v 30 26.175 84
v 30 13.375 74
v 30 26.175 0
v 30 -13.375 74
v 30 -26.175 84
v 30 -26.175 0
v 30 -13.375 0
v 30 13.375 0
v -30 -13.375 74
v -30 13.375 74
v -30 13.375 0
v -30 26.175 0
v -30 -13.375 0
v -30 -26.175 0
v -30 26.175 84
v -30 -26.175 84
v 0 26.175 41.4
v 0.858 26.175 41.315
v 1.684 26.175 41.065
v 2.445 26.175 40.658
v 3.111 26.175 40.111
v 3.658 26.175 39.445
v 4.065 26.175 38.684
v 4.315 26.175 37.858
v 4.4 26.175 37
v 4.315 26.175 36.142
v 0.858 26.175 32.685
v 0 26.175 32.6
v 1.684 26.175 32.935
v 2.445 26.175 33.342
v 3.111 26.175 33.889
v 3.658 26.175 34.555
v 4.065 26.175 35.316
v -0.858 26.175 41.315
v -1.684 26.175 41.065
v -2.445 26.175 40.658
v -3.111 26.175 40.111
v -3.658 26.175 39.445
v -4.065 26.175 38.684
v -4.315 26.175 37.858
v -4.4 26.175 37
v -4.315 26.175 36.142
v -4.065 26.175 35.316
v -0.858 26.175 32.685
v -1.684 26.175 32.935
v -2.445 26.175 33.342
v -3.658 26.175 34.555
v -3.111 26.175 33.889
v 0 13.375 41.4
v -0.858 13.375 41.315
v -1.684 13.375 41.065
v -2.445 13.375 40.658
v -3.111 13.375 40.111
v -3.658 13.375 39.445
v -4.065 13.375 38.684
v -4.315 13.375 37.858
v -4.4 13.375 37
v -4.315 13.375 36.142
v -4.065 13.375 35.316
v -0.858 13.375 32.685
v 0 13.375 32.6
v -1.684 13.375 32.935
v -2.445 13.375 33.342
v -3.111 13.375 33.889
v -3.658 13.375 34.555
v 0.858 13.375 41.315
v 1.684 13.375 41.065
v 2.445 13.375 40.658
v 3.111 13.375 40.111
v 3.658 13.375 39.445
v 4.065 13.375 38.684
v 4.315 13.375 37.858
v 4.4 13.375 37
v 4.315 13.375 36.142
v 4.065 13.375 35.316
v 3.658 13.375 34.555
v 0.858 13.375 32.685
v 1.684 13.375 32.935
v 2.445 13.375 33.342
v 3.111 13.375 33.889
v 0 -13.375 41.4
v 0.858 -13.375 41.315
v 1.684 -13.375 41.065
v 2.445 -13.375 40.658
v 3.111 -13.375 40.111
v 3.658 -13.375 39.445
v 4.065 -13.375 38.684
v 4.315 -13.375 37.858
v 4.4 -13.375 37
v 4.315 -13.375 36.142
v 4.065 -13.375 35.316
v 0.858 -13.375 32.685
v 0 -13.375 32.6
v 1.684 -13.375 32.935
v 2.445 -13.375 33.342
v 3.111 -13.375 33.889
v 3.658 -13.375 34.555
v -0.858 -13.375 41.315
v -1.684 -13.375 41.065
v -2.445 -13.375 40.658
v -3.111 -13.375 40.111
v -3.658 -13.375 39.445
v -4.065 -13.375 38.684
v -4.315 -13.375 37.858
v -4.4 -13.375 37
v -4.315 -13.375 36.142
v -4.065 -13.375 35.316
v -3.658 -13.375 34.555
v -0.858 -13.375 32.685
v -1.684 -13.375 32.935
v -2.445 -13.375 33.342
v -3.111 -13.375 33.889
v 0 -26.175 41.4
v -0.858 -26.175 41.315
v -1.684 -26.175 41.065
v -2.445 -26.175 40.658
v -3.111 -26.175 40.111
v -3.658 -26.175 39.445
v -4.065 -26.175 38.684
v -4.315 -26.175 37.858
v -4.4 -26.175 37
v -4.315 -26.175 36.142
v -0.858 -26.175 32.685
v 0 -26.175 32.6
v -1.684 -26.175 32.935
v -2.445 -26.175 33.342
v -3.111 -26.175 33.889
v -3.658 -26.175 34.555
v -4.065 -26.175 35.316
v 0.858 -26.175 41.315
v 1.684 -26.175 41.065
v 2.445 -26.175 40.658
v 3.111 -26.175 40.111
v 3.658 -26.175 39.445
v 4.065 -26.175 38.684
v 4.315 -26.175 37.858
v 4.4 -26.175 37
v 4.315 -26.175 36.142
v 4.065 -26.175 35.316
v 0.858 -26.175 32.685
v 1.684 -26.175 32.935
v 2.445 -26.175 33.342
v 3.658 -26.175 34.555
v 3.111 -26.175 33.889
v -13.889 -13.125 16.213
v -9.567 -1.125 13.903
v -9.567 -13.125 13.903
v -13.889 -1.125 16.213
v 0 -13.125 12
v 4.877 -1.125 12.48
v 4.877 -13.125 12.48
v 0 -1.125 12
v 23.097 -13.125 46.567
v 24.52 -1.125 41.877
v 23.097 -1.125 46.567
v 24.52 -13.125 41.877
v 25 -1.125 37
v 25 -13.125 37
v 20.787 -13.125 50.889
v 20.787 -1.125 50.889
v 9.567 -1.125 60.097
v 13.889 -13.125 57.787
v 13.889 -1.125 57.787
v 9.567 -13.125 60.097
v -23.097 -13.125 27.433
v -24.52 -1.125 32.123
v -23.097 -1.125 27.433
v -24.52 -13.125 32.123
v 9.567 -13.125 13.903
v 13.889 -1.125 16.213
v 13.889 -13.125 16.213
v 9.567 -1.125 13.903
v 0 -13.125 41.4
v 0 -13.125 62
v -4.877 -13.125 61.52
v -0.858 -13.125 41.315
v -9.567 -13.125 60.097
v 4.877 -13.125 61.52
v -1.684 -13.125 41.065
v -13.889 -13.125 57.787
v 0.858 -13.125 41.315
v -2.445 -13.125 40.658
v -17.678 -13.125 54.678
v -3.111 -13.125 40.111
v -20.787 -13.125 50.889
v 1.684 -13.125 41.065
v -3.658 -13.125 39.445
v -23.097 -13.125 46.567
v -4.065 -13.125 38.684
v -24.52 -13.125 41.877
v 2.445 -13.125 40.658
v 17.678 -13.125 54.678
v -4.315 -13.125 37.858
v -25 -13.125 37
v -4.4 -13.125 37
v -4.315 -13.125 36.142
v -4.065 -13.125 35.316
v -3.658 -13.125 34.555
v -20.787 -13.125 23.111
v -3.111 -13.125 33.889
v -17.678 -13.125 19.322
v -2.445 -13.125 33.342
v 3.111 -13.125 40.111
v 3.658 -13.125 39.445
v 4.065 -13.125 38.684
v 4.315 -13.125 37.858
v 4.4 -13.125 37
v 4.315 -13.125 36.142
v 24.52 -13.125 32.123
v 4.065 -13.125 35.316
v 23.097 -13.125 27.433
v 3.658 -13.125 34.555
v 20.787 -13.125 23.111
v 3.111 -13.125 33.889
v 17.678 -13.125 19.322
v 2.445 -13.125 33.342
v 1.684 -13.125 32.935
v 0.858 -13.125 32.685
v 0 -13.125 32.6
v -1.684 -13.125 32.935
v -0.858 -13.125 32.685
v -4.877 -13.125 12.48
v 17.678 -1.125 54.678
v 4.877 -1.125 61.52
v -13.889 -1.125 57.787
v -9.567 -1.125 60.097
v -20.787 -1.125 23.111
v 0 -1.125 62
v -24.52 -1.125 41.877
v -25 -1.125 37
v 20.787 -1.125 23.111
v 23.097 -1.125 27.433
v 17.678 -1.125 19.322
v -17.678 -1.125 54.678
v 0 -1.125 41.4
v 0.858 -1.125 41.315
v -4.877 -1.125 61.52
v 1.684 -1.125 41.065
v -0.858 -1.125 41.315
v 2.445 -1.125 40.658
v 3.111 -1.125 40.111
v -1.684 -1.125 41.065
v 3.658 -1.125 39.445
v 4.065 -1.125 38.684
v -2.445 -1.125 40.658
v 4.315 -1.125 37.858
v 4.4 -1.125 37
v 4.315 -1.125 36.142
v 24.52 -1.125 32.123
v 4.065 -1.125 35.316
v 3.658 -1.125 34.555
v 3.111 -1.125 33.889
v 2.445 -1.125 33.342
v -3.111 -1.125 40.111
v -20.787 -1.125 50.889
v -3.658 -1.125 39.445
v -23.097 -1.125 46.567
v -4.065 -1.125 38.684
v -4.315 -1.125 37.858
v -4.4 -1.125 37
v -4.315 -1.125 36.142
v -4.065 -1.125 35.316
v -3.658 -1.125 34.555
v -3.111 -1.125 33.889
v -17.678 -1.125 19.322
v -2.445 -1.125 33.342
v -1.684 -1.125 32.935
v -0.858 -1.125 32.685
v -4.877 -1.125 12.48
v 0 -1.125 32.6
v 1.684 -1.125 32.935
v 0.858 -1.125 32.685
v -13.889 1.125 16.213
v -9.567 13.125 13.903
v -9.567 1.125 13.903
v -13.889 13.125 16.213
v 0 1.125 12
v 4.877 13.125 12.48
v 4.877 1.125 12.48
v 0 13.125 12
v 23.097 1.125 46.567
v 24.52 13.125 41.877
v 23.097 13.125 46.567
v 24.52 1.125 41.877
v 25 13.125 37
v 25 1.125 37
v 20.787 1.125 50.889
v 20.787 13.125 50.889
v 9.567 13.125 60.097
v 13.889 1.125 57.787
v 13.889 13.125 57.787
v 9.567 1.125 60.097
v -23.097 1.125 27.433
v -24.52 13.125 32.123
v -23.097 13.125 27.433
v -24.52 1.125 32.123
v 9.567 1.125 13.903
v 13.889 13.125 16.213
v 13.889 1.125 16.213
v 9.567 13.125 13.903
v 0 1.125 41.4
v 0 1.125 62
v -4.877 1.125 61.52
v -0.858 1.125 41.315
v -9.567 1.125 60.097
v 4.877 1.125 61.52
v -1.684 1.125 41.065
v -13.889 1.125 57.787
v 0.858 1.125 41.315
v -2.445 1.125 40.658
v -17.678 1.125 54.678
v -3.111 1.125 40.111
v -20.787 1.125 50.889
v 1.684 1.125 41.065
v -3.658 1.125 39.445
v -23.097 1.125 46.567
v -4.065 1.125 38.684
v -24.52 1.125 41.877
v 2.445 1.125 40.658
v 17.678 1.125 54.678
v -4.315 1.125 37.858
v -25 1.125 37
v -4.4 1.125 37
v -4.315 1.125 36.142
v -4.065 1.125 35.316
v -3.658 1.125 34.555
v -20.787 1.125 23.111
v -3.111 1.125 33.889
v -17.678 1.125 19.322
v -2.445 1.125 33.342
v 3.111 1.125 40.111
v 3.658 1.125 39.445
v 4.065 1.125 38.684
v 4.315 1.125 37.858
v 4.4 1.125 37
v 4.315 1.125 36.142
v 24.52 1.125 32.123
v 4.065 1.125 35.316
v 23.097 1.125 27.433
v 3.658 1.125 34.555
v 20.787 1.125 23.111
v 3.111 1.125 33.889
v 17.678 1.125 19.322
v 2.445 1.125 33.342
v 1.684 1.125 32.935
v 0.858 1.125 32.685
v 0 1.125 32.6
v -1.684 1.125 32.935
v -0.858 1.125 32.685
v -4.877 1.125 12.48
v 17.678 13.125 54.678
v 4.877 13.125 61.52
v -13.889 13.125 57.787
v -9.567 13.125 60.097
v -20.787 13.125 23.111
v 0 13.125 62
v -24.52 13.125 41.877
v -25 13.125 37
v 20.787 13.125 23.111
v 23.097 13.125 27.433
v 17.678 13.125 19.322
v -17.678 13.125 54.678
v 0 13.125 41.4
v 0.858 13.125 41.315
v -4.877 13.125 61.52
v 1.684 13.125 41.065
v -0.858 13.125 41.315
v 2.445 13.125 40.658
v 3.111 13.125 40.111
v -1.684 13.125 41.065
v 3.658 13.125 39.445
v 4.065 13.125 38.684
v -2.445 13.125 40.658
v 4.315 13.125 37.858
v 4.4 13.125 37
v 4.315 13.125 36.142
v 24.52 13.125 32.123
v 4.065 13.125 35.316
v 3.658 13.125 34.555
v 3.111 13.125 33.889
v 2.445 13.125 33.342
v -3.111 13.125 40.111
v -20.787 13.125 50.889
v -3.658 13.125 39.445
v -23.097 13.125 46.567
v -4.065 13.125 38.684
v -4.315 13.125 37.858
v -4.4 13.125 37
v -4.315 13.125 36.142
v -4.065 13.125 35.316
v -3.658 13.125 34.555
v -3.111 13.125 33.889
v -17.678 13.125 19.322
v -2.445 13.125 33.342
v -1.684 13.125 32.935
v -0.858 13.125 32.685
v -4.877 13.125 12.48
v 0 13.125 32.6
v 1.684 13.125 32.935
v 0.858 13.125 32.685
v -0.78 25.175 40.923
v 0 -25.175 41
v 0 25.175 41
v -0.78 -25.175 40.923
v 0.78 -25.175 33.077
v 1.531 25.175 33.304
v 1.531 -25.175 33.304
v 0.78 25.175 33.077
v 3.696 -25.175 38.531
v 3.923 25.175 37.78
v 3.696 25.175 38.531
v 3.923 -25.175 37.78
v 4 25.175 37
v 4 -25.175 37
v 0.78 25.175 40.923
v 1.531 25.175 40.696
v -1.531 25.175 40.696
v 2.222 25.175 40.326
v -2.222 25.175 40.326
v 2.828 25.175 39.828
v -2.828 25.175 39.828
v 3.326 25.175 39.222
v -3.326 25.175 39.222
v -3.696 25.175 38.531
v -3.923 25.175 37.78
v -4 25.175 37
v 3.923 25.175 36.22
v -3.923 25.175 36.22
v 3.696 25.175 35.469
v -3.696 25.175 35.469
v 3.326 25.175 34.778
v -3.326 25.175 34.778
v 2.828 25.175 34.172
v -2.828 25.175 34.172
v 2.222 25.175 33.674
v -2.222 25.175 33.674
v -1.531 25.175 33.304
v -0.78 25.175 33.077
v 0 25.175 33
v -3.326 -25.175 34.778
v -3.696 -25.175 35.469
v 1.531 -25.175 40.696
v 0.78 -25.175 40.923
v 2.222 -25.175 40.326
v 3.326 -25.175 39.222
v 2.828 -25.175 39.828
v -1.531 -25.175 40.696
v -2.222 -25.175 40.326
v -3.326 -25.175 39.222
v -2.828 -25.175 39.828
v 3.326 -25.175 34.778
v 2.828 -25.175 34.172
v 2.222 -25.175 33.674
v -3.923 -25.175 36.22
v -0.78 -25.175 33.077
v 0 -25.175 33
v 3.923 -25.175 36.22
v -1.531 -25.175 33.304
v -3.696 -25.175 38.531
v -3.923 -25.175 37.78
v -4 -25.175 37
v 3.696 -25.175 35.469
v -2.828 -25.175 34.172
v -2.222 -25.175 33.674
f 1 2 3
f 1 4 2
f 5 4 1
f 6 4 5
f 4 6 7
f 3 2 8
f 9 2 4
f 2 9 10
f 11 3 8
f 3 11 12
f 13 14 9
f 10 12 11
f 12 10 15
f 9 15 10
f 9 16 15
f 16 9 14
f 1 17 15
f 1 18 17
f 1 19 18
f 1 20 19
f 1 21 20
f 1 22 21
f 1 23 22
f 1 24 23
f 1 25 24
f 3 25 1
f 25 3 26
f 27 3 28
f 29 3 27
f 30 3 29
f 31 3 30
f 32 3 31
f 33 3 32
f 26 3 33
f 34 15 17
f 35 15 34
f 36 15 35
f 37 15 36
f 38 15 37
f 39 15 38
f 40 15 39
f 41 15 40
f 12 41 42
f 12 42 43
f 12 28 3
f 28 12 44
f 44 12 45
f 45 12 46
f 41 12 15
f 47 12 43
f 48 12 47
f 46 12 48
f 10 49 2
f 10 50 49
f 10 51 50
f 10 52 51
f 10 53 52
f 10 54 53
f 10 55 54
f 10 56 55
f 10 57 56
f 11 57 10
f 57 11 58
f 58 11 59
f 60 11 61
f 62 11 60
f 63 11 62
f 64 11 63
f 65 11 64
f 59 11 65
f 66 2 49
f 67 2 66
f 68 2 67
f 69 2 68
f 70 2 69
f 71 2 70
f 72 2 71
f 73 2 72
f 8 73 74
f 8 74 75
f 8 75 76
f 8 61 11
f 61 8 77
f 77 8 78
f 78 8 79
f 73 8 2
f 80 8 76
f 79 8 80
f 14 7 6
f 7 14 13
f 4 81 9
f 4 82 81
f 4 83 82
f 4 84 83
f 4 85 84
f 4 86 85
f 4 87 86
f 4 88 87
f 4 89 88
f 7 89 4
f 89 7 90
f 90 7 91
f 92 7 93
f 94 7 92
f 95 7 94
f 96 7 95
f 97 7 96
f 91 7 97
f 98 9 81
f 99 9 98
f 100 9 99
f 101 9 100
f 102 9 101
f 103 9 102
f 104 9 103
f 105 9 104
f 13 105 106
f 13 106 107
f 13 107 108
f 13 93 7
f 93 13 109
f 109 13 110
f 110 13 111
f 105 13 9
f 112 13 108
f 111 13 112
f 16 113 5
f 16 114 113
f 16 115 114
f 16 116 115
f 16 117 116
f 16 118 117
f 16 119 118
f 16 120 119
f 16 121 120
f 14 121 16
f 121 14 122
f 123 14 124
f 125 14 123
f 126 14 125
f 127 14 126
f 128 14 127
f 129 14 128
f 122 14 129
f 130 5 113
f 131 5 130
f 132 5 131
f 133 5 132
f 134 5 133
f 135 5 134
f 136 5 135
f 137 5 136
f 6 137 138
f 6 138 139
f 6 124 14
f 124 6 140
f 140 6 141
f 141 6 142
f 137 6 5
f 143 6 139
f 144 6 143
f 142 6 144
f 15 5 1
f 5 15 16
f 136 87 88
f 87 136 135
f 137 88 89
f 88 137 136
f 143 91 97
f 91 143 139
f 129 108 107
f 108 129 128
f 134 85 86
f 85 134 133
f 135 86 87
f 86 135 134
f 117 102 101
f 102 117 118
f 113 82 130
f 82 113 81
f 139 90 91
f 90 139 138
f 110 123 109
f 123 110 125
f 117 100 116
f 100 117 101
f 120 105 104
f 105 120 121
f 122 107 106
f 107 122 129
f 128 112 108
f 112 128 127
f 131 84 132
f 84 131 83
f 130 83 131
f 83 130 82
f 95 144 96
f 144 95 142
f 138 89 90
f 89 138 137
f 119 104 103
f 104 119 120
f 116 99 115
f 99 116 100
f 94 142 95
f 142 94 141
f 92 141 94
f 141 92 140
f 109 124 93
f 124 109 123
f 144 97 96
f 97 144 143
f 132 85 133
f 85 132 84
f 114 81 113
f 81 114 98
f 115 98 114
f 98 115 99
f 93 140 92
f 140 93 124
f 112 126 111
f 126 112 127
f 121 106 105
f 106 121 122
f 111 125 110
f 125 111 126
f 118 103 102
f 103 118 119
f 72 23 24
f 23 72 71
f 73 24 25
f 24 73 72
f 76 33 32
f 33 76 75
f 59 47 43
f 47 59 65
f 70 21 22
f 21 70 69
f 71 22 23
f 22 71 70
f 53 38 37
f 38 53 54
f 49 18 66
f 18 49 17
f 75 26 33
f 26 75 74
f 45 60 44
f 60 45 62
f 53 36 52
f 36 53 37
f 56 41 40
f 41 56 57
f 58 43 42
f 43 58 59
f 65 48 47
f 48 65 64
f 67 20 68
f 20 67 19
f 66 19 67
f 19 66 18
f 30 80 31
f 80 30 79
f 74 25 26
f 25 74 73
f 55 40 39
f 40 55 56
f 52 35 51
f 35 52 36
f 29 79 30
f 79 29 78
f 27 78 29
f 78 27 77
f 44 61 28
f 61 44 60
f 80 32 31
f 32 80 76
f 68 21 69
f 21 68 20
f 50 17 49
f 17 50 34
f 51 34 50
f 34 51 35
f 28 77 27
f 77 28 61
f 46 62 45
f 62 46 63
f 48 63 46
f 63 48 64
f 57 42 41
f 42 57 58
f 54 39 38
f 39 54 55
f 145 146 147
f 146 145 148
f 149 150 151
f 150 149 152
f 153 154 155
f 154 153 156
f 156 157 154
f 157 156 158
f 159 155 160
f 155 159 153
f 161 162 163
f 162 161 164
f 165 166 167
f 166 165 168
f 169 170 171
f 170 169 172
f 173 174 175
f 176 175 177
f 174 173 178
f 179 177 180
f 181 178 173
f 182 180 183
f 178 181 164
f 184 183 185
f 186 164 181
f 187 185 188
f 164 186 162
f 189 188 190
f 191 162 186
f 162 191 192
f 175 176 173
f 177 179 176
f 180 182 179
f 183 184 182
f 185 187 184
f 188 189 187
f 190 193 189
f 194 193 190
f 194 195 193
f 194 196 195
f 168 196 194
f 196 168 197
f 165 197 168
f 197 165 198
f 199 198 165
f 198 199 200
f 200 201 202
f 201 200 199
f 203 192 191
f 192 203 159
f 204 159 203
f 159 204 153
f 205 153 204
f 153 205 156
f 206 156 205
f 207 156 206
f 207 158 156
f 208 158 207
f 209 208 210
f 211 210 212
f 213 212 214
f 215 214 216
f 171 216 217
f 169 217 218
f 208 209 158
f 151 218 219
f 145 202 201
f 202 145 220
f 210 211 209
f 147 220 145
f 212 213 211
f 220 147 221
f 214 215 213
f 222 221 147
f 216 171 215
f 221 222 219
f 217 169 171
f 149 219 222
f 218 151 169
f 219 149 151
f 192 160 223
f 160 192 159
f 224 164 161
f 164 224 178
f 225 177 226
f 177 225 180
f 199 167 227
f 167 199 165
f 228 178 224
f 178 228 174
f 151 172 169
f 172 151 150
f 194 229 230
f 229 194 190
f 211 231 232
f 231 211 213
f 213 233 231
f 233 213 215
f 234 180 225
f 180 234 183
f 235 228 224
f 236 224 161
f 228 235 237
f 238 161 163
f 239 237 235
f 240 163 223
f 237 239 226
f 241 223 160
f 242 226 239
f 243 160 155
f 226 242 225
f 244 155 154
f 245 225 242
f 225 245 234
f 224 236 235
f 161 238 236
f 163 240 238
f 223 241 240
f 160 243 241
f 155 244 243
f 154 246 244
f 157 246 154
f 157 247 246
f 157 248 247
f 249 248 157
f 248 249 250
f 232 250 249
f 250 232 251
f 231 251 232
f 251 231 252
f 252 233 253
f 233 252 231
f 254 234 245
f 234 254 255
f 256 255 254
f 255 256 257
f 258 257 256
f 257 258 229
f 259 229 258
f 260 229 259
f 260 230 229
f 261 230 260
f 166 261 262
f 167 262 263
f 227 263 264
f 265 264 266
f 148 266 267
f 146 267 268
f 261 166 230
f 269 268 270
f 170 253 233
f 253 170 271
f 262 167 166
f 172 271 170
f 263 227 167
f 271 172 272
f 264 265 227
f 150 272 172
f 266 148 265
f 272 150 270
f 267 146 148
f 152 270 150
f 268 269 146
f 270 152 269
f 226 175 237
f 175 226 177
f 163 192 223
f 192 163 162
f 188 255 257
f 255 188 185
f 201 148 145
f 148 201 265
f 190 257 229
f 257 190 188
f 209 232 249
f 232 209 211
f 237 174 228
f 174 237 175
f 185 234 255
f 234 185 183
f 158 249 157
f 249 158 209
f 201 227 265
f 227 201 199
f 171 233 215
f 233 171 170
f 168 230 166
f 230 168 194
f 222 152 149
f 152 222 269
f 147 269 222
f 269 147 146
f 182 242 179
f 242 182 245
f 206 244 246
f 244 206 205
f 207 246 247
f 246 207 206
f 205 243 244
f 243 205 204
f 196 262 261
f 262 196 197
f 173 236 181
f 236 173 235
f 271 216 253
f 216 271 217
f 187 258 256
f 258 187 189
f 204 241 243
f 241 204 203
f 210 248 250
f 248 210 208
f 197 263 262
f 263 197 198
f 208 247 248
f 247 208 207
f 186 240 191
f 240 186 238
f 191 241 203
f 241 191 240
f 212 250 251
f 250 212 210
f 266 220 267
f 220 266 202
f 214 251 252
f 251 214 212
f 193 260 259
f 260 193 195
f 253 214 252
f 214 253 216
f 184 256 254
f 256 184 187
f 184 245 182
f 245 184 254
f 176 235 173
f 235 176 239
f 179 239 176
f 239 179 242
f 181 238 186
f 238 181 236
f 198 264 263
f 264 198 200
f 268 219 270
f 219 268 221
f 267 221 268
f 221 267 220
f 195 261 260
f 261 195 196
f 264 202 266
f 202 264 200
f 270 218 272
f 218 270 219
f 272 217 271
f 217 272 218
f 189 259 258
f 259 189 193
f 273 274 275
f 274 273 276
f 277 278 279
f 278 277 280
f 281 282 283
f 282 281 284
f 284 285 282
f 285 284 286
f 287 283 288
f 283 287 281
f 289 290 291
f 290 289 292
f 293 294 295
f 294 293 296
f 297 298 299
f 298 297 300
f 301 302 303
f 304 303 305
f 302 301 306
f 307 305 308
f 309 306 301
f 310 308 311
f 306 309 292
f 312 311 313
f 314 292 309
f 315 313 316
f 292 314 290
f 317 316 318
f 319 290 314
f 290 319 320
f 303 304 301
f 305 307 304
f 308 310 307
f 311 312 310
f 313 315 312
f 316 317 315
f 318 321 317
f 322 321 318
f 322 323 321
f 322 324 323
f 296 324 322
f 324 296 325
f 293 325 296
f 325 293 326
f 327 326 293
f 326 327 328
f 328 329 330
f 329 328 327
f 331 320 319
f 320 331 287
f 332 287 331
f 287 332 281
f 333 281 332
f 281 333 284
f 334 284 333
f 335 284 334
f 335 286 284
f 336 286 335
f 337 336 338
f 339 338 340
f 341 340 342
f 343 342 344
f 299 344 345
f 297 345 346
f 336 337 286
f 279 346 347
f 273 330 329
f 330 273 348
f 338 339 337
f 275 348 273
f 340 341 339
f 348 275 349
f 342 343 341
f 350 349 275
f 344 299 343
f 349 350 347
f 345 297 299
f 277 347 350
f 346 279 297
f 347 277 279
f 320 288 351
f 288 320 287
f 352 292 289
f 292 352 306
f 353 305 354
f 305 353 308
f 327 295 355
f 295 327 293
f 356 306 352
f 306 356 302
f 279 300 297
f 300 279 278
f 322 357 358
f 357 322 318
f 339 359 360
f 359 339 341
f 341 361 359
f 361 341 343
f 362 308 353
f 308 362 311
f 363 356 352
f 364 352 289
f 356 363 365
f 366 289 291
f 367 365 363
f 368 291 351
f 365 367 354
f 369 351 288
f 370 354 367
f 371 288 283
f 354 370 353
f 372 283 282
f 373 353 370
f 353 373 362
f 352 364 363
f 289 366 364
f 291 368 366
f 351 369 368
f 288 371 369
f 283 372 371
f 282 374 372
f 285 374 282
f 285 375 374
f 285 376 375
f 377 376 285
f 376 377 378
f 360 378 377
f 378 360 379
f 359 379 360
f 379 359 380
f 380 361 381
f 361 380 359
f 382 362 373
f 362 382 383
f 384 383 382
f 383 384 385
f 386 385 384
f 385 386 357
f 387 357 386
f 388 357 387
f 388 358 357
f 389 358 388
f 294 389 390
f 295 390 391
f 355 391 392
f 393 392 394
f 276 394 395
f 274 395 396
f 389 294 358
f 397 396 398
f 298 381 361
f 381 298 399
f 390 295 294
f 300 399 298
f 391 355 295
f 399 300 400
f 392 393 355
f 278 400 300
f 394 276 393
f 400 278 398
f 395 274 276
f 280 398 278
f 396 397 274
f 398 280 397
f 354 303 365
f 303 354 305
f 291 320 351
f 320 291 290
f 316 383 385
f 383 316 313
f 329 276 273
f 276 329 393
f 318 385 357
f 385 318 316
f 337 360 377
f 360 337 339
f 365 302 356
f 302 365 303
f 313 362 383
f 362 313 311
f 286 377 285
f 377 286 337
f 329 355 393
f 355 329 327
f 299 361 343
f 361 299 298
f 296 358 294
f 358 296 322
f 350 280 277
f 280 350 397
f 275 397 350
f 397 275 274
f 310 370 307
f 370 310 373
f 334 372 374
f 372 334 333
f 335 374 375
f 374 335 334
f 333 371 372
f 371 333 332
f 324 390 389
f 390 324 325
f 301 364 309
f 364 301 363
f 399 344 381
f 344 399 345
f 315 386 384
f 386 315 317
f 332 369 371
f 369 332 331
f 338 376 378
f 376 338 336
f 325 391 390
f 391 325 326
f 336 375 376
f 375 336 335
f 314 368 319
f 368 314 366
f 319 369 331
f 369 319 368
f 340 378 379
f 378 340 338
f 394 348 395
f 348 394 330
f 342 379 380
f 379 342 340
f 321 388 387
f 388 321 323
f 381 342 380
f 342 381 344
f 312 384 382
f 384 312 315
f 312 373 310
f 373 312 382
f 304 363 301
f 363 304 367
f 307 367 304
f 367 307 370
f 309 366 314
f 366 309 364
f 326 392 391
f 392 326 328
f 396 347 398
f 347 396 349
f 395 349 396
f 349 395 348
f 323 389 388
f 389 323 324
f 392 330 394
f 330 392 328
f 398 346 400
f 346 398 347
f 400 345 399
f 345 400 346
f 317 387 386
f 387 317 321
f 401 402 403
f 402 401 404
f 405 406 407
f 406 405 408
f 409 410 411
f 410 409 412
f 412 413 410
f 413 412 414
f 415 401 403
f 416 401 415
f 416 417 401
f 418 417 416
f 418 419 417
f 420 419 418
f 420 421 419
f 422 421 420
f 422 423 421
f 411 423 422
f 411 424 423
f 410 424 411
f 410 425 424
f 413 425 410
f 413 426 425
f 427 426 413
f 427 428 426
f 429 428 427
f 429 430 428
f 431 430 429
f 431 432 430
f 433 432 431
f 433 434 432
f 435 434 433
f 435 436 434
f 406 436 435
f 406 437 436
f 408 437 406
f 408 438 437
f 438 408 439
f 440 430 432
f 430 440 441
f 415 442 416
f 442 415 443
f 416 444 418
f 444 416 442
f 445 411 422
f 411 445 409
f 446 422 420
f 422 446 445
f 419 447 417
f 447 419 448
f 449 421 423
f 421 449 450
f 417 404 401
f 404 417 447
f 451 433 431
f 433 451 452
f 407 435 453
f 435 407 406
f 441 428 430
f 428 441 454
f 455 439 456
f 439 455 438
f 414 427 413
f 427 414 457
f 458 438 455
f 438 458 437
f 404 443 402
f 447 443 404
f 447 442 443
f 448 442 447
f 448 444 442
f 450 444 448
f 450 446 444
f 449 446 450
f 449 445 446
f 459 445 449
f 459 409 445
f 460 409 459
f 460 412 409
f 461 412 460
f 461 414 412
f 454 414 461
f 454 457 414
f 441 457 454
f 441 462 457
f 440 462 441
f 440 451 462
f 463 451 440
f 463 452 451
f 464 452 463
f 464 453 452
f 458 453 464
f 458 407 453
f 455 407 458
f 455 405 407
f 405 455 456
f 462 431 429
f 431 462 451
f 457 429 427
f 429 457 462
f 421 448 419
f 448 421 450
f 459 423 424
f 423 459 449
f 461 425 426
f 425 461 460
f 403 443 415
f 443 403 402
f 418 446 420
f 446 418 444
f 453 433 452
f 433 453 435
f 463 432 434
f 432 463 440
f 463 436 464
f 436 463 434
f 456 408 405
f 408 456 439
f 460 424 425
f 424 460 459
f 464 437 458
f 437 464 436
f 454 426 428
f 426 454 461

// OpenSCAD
$fn = 32;

// ------------------------------------------------------------------------
// Trolley wheel set: wheels d50, fork 74 mm tall
// Every part is its own module, assembly() places every instance.
// ------------------------------------------------------------------------

// --- part 1 ---
module trolley_fork() {
  difference() {
    union() {
      translate([-30, 13.375, 0]) cube([60, 12.8, 74]);
      translate([-30, -26.175, 0]) cube([60, 12.8, 74]);
      translate([-30, -26.175, 74]) cube([60, 52.35, 10]);
    }
    translate([0, -19.775, 37]) rotate([90, 0, 0]) cylinder(h = 14.8, d = 8.8, center = true);
    translate([0, 19.775, 37]) rotate([90, 0, 0]) cylinder(h = 14.8, d = 8.8, center = true);
  }
}

// --- part 2 ---
module trolley_wheel() {
  difference() {
      translate([0, 0, 0]) cylinder(h = 12, d = 50);
      translate([0, 0, -1]) cylinder(h = 14, d = 8.8);
    }
}

// --- part 3 ---
module trolley_axle() {
  translate([0, 0, -25.175]) cylinder(h = 50.35, d = 8);
}

// --- assembly ---
module assembly() {
  color([0.80, 0.24, 0.20]) translate([0, 0, 0]) rotate([0, 0, 0]) trolley_fork();
  color([0.20, 0.45, 0.75]) translate([0, -1.125, 37]) rotate([90, 0, 0]) trolley_wheel();
  color([0.25, 0.62, 0.32]) translate([0, 13.125, 37]) rotate([90, 0, 0]) trolley_wheel();
  color([0.92, 0.70, 0.18]) translate([0, 0, 37]) rotate([90, 0, 0]) trolley_axle();
}

assembly();
